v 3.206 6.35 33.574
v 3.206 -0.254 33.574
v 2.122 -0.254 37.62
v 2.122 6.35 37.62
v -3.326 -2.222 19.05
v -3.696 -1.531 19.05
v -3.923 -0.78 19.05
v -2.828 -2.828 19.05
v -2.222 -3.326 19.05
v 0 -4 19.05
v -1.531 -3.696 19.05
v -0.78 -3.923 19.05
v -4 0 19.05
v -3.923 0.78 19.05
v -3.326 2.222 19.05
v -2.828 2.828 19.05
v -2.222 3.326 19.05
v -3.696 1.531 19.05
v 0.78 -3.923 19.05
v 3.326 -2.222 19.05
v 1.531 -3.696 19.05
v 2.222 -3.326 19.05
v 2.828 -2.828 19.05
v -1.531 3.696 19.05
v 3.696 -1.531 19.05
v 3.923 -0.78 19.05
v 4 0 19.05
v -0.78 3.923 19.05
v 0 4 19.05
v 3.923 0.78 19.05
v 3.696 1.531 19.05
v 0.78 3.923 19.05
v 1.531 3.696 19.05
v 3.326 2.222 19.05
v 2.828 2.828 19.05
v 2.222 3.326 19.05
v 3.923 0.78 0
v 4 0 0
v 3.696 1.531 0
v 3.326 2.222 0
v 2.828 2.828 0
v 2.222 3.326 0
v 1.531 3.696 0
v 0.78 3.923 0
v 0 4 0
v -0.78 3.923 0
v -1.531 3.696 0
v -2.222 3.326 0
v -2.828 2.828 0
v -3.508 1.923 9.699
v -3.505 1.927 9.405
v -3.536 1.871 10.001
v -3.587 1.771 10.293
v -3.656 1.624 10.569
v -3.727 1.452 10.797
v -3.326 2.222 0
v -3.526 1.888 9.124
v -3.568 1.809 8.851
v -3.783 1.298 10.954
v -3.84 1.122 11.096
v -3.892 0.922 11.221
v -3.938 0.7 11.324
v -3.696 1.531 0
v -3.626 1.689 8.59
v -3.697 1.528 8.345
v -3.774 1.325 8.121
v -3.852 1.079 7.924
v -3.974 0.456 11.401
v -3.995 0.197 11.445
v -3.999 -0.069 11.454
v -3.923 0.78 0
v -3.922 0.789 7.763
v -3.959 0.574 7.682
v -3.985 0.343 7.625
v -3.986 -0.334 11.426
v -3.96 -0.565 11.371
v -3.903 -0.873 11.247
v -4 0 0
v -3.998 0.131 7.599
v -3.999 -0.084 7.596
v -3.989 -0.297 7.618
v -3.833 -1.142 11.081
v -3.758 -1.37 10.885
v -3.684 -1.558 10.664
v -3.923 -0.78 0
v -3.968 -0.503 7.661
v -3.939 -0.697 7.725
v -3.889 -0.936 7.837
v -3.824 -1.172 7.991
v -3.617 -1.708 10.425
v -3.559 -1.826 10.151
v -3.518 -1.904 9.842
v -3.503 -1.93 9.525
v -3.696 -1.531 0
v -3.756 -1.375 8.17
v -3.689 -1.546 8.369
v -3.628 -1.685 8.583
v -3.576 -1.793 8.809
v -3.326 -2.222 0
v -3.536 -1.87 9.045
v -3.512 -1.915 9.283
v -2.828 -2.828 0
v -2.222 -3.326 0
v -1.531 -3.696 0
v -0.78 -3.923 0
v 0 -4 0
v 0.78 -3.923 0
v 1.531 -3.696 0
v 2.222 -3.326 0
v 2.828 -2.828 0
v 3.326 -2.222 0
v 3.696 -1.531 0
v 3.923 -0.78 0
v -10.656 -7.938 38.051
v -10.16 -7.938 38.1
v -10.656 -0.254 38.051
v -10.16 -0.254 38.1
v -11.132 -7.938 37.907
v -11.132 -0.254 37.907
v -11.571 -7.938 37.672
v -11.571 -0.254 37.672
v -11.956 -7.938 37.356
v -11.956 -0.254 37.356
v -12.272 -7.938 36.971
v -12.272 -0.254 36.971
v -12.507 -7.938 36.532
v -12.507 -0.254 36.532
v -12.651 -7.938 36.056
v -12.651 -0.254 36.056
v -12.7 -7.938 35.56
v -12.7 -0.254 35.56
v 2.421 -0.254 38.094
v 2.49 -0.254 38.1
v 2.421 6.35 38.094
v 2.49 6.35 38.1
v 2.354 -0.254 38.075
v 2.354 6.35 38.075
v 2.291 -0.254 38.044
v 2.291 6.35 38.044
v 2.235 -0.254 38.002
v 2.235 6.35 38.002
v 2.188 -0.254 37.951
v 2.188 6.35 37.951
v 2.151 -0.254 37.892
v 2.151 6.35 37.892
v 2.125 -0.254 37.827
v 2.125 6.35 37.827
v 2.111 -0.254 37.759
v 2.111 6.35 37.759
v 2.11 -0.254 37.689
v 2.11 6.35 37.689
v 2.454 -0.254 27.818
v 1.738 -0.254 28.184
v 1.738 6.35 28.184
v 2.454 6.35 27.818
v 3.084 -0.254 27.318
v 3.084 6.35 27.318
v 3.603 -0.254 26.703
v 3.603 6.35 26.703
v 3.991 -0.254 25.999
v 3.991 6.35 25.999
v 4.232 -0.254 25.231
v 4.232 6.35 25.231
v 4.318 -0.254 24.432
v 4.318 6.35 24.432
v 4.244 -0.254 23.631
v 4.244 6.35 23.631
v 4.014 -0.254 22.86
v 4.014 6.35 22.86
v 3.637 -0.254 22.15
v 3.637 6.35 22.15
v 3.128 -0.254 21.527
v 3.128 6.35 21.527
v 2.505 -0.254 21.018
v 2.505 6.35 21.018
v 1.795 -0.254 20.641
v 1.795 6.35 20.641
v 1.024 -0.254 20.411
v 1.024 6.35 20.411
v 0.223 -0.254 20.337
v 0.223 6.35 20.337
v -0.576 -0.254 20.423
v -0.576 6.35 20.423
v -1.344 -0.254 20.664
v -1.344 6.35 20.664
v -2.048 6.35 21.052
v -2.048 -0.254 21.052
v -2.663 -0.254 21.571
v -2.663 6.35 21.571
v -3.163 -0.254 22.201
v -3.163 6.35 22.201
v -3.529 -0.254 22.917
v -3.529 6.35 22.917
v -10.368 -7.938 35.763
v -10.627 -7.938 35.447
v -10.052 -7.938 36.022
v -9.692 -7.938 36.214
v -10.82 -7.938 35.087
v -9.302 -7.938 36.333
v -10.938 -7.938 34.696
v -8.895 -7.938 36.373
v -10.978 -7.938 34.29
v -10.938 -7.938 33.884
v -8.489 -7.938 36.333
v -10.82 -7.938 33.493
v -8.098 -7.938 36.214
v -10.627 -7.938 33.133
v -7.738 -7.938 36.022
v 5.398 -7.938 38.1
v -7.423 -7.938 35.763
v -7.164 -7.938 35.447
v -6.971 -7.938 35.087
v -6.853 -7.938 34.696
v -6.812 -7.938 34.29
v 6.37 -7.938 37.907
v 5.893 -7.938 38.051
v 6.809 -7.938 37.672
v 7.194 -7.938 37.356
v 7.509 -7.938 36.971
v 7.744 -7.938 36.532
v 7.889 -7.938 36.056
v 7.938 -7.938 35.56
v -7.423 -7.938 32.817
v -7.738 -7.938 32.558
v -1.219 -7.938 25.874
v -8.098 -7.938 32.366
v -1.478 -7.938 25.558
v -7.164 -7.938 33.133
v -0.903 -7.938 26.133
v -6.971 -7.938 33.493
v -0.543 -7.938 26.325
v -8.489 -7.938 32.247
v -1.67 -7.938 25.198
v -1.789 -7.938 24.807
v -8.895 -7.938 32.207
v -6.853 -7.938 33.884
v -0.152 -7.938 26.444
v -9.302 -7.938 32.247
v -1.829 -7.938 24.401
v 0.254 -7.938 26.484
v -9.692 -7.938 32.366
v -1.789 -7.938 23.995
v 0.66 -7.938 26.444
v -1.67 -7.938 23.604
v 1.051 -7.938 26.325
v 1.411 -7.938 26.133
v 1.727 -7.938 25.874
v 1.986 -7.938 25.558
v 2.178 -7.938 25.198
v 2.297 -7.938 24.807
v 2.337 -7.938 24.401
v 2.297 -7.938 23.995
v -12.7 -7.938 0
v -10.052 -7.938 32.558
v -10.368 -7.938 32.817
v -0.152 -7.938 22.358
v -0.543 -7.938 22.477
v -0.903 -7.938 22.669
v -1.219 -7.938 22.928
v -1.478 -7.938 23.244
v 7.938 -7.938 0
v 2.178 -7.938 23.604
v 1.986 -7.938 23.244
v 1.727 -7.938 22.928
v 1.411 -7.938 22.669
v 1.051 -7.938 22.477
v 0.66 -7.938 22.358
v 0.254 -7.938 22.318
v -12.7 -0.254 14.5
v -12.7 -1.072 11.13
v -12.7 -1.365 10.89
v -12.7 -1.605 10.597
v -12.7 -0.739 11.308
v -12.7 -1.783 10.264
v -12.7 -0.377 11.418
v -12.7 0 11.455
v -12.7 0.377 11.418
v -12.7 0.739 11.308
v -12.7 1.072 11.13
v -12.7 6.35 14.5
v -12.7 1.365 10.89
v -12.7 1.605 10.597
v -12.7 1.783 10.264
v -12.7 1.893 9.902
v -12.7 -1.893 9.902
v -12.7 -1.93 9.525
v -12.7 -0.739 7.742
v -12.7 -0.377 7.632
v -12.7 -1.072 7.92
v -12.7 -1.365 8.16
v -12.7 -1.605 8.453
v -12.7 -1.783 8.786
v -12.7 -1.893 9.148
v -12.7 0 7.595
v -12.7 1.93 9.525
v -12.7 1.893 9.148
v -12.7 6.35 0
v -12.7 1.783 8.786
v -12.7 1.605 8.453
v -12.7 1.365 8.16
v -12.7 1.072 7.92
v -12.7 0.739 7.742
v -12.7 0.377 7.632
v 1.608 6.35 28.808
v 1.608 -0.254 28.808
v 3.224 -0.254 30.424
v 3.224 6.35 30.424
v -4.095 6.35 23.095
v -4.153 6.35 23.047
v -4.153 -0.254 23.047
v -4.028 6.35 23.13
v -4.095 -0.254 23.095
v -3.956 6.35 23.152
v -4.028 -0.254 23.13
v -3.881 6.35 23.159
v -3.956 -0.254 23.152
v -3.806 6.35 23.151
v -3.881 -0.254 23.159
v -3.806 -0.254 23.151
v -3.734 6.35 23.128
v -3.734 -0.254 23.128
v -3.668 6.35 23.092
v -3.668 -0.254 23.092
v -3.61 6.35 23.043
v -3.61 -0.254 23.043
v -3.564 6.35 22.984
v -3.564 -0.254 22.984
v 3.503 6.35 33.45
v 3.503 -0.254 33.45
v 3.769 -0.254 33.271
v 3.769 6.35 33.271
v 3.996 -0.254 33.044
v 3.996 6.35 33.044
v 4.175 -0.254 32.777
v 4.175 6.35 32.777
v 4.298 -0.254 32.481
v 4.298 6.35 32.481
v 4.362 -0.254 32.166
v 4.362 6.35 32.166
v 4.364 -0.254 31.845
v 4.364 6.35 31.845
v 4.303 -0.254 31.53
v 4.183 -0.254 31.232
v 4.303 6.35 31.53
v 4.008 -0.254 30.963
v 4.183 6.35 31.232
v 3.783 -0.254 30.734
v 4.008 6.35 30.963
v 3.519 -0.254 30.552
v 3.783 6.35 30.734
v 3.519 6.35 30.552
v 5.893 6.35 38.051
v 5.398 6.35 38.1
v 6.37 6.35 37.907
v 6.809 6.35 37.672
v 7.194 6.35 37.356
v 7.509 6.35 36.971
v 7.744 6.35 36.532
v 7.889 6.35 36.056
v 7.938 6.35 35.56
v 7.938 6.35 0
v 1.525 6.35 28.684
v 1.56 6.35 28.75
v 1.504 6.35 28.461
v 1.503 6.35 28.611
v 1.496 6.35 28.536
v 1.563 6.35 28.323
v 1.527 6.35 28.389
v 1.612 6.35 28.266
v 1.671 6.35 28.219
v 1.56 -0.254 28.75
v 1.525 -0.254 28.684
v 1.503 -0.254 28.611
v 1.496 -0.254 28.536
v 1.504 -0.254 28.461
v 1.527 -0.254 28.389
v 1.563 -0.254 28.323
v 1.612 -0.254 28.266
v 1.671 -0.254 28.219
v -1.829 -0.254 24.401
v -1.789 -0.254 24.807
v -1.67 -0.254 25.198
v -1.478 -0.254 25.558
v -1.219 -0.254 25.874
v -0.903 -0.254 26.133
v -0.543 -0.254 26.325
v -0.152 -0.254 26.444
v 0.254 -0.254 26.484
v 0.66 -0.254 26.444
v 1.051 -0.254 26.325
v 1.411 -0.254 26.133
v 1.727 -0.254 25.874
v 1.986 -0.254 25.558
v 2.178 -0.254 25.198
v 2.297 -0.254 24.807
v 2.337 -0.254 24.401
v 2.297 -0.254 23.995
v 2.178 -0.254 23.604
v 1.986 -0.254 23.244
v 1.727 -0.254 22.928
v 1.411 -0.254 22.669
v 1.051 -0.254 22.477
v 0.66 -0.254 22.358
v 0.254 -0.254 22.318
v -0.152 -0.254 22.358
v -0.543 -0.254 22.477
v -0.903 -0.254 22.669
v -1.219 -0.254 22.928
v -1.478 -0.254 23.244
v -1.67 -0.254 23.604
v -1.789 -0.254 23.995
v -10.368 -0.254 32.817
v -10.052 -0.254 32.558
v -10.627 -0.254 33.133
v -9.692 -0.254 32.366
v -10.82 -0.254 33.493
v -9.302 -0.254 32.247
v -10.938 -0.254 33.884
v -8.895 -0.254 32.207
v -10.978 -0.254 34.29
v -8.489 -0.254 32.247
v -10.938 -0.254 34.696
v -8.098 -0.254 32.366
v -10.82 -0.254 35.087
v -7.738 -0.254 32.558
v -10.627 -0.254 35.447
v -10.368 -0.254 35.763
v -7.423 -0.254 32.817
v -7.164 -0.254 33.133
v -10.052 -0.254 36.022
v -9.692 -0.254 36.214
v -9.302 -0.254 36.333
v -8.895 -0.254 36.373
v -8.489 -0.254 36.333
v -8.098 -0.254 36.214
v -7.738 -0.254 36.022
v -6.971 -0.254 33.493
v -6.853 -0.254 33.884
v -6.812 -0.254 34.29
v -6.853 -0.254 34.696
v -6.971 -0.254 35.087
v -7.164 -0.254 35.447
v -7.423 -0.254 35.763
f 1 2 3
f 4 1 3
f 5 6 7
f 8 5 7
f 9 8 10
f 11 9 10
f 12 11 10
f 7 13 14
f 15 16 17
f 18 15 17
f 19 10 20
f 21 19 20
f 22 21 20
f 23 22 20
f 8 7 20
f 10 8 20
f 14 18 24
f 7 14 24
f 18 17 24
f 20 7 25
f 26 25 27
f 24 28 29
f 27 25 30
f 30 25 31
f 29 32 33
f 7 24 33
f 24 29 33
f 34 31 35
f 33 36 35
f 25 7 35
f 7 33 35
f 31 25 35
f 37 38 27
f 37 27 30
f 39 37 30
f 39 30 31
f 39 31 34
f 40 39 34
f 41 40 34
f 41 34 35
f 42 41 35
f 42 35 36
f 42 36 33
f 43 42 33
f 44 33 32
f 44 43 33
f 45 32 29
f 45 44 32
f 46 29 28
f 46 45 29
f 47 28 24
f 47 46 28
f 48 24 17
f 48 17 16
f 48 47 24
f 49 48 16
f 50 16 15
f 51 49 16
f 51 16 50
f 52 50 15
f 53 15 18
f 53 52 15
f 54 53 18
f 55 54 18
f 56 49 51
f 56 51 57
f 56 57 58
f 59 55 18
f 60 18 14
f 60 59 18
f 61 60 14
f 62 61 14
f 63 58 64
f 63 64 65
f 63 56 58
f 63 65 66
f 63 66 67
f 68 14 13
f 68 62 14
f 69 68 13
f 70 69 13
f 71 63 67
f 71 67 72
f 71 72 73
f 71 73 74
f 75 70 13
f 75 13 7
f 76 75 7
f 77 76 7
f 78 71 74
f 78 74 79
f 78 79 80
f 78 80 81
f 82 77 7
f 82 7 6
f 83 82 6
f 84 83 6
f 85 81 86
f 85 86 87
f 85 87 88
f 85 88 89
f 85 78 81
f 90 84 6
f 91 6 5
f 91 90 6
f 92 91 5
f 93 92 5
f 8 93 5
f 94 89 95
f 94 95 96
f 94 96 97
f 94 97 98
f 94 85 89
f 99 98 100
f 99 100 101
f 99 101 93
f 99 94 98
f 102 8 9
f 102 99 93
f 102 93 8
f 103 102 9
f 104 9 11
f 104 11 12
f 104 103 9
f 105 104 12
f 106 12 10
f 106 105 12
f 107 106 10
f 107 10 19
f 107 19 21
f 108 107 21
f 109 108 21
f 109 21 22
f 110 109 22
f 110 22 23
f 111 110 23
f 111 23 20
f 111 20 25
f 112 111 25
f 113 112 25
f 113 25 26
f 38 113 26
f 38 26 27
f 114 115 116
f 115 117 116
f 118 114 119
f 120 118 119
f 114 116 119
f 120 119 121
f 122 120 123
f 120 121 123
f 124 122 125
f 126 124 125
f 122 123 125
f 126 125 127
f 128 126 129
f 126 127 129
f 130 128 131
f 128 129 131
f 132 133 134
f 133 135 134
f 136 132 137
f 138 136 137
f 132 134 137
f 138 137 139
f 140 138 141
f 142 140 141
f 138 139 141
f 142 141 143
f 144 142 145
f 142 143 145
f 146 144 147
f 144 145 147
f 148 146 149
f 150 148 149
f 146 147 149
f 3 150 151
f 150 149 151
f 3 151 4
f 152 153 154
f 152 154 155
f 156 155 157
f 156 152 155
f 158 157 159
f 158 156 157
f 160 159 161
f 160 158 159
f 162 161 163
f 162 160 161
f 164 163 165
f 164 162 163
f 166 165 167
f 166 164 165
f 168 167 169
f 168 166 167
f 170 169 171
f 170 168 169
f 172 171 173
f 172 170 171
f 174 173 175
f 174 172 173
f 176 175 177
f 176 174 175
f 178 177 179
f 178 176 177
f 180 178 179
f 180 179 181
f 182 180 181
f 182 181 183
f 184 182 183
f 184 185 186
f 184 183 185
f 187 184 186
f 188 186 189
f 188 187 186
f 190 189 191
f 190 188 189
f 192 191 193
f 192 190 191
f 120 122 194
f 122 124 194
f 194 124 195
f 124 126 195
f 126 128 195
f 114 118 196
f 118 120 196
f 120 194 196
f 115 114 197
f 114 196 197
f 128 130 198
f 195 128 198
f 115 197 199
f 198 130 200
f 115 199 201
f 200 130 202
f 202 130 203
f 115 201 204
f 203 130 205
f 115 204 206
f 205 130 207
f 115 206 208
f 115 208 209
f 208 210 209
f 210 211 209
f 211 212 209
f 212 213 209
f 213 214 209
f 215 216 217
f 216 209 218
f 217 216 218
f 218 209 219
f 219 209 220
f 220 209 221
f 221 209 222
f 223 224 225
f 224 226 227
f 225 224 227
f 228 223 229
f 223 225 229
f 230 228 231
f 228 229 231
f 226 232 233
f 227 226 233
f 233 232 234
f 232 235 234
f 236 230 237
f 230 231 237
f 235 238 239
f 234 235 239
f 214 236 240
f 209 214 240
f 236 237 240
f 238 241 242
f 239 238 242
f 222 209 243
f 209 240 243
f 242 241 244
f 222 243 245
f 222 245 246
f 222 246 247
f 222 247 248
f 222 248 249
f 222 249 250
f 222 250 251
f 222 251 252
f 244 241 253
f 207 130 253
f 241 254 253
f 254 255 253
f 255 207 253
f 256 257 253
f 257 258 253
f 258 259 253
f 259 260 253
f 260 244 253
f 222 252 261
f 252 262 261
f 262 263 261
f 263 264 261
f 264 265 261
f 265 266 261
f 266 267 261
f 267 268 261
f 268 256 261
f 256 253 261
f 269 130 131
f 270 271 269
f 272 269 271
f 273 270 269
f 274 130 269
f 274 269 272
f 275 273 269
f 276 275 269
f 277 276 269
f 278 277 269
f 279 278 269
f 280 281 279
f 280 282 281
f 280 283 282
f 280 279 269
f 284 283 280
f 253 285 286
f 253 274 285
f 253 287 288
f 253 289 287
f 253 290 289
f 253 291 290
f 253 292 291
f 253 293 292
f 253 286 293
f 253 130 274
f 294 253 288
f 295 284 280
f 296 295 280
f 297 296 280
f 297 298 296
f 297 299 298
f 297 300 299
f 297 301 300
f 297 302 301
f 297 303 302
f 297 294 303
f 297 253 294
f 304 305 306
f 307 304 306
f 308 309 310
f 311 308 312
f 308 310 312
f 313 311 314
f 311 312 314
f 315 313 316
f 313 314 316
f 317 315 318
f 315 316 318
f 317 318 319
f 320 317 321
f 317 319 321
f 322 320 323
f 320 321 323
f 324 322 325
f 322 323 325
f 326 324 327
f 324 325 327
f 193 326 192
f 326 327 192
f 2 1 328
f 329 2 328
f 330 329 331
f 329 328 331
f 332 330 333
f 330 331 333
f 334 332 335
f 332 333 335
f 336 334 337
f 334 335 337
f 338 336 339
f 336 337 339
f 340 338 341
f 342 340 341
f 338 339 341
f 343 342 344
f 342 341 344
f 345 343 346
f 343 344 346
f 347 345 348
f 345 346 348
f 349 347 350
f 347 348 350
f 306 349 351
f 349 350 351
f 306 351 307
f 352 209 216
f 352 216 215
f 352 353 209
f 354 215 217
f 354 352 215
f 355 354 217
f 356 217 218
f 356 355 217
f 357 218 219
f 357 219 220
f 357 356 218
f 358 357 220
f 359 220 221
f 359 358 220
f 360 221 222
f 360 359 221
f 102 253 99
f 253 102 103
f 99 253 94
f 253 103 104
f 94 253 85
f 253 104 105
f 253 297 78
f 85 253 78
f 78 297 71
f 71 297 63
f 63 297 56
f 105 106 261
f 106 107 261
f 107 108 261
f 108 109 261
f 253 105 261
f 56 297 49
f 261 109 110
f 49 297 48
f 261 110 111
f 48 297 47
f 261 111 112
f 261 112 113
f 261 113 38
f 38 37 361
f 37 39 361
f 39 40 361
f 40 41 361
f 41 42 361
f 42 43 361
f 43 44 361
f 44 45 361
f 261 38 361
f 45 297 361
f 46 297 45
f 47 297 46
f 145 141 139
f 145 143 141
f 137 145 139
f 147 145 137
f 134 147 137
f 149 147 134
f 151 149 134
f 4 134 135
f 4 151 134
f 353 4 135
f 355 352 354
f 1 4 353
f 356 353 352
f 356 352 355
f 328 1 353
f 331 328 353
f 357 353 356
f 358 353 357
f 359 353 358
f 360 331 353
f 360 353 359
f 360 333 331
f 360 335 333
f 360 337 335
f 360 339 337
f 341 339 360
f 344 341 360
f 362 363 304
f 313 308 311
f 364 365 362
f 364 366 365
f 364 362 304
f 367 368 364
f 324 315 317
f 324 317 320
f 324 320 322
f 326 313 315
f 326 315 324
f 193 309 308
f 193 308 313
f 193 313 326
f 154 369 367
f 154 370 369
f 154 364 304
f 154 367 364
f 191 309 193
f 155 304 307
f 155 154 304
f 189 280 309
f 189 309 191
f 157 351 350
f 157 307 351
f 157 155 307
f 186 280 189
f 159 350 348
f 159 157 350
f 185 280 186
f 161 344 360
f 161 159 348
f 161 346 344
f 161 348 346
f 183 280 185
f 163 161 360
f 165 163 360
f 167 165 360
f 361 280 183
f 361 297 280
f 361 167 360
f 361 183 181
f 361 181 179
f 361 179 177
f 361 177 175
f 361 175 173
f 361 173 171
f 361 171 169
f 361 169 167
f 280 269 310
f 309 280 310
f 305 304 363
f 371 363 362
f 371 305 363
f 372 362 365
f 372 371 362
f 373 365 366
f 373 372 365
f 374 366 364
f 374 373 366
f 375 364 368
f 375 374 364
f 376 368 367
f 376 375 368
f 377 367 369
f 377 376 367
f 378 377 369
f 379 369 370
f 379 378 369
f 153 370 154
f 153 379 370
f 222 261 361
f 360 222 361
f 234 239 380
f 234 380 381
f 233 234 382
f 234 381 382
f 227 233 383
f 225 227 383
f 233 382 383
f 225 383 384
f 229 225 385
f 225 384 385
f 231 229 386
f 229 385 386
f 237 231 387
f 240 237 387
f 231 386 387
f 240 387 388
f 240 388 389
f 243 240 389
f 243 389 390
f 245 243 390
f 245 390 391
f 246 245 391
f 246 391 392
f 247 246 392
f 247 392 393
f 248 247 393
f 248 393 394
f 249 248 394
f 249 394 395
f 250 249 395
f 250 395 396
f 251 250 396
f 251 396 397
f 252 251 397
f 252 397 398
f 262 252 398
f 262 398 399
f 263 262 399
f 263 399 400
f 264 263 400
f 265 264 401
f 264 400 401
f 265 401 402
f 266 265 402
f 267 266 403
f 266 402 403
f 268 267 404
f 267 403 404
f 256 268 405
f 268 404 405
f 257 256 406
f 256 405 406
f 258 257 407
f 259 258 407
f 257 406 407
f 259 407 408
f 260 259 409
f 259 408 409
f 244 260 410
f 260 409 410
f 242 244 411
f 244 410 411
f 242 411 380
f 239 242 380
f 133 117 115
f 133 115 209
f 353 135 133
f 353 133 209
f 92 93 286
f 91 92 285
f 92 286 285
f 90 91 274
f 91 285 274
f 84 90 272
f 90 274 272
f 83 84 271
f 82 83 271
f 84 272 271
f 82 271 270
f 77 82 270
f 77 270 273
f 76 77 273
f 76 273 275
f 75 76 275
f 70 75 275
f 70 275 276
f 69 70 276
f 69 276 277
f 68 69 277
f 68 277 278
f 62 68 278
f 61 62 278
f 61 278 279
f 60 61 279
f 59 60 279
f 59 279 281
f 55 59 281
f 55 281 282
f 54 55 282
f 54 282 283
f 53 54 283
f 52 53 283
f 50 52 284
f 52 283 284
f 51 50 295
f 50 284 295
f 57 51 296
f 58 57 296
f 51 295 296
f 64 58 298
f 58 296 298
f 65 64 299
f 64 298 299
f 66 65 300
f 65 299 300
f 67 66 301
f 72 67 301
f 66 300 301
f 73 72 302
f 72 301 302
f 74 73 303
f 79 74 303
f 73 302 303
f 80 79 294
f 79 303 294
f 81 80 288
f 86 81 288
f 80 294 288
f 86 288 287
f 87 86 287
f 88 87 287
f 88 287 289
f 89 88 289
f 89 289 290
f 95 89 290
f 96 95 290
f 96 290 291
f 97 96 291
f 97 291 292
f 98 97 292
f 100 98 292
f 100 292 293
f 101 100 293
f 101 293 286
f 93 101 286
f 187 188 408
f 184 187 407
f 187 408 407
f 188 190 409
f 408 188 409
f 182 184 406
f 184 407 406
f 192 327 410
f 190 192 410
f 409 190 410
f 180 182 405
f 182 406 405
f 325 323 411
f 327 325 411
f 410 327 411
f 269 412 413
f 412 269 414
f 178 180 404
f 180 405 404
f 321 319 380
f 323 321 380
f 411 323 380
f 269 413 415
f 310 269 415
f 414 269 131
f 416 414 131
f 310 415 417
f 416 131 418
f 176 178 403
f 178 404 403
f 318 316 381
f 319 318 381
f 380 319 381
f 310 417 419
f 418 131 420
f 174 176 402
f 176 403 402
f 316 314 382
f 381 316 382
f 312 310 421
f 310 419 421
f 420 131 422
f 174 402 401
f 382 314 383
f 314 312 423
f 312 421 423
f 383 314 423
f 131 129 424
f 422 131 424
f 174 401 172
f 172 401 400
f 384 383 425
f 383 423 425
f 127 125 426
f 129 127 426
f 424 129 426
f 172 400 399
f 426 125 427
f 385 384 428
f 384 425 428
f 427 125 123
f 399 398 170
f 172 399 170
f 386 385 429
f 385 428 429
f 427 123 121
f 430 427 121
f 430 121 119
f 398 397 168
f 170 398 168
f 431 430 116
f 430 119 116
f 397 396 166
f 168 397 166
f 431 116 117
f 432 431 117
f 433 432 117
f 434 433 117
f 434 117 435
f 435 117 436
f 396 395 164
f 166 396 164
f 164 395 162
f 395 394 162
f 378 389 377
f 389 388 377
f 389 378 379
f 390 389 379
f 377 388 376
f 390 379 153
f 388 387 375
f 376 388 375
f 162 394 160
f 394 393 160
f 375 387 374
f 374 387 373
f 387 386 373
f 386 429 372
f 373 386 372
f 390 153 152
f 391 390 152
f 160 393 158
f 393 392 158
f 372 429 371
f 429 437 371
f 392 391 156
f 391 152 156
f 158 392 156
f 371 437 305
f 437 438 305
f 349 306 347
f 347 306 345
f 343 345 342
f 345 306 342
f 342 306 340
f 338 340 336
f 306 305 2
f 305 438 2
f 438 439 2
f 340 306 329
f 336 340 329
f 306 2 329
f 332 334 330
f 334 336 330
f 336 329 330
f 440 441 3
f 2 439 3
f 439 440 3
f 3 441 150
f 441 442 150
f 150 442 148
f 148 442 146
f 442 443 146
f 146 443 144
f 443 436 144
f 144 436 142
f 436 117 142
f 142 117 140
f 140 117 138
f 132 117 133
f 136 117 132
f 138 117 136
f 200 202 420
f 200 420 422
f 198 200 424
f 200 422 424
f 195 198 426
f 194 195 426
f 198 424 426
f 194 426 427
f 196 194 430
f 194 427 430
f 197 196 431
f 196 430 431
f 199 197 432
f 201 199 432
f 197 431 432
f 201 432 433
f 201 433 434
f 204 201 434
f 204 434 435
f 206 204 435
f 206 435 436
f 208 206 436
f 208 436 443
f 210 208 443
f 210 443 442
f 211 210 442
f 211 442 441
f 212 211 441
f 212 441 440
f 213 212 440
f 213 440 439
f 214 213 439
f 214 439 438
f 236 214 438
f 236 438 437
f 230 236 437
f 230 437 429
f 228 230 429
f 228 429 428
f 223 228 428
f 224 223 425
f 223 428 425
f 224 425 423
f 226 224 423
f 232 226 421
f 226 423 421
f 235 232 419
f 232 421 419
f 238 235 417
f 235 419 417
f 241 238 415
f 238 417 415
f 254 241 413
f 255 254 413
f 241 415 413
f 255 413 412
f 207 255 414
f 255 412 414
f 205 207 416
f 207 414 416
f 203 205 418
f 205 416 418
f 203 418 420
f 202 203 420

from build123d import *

# Parameters (mm, degrees)
F0_W      = 20.6375
F0_H      = 14.2875
F1_DEPTH  = 38.1
F2_R      = 4
F3_DEPTH  = 19.05
F6_DEPTH  = 22.61794
F7_R      = 1.651
F8_DEPTH  = 6.604
F9_R      = 2.0828
F10_DEPTH = 25.4
F11_R     = 4.064
F12_DEPTH = 25.4
F13_R     = 0.381
F14_R     = 1.9304
F15_DEPTH = 15.3176
F16_R     = 2.54


with BuildPart() as f1:
    # F0 (on Top) → F1 (new body)
    with BuildSketch(Plane.XY):
        with Locations((-2.38125, -0.79375)):
            Rectangle(F0_W, F0_H)
    extrude(amount=F1_DEPTH)

    # F2 (on Top) → F3 (cut)
    with BuildSketch(Plane.XY):
        Circle(F2_R)
    extrude(amount=F3_DEPTH, mode=Mode.SUBTRACT)

    # F5 (on offset) → F6 (cut)
    with BuildSketch(Plane.XZ.offset(0.254)):
        Polygon((-24.257, 41.275), (-24.257, 2.9434311857), (3.8757620392, 31.0761932248), (1.143, 41.275), align=None)
    extrude(amount=-F6_DEPTH, mode=Mode.SUBTRACT)

    # F7 (on face) → F8 (cut, through all)
    with BuildSketch(Plane(origin=(0, 6.35, 0), x_dir=(-1, 0, 0), z_dir=(0, 1, 0))):
        with Locations((-2.7197583304, 31.9964899328)):
            Circle(F7_R)
    extrude(amount=-F8_DEPTH, mode=Mode.SUBTRACT)

    # F9 (on face) → F10 (cut)
    with BuildSketch(Plane(origin=(0, 6.35, 0), x_dir=(-1, 0, 0), z_dir=(0, 1, 0))):
        with Locations((-0.254, 24.4011441045)):
            Circle(F9_R)
        with Locations((8.8952870812, 34.29)):
            Circle(F9_R)
    extrude(amount=-F10_DEPTH, mode=Mode.SUBTRACT)

    # F11 (on face) → F12 (cut)
    with BuildSketch(Plane(origin=(0, -0.254, 0), x_dir=(-1, 0, 0), z_dir=(0, 1, 0))):
        with Locations((-0.254, 24.4011441045)):
            Circle(F11_R)
    extrude(amount=F12_DEPTH, mode=Mode.SUBTRACT)

    # F13
    f13_edges = [f1.edges().sort_by_distance(p)[0] for p in [
        (-3.70727, 3.048, 23.493161),
        (1.161983, 3.048, 28.362414),
        (1.993739, 3.048, 38.1),
    ]]
    fillet(f13_edges, radius=F13_R)

    # F14 (on face) → F15 (cut)
    with BuildSketch(Plane(origin=(-12.7, 0, 0), x_dir=(0, -1, 0), z_dir=(-1, 0, 0))):
        with Locations((0, 9.525)):
            Circle(F14_R)
    extrude(amount=-F15_DEPTH, mode=Mode.SUBTRACT)

    # F16
    f16_edges = [f1.edges().sort_by_distance(p)[0] for p in [
        (-12.7, -4.09575, 38.1),
        (7.9375, -0.79375, 38.1),
    ]]
    fillet(f16_edges, radius=F16_R)


solid = f1.part
